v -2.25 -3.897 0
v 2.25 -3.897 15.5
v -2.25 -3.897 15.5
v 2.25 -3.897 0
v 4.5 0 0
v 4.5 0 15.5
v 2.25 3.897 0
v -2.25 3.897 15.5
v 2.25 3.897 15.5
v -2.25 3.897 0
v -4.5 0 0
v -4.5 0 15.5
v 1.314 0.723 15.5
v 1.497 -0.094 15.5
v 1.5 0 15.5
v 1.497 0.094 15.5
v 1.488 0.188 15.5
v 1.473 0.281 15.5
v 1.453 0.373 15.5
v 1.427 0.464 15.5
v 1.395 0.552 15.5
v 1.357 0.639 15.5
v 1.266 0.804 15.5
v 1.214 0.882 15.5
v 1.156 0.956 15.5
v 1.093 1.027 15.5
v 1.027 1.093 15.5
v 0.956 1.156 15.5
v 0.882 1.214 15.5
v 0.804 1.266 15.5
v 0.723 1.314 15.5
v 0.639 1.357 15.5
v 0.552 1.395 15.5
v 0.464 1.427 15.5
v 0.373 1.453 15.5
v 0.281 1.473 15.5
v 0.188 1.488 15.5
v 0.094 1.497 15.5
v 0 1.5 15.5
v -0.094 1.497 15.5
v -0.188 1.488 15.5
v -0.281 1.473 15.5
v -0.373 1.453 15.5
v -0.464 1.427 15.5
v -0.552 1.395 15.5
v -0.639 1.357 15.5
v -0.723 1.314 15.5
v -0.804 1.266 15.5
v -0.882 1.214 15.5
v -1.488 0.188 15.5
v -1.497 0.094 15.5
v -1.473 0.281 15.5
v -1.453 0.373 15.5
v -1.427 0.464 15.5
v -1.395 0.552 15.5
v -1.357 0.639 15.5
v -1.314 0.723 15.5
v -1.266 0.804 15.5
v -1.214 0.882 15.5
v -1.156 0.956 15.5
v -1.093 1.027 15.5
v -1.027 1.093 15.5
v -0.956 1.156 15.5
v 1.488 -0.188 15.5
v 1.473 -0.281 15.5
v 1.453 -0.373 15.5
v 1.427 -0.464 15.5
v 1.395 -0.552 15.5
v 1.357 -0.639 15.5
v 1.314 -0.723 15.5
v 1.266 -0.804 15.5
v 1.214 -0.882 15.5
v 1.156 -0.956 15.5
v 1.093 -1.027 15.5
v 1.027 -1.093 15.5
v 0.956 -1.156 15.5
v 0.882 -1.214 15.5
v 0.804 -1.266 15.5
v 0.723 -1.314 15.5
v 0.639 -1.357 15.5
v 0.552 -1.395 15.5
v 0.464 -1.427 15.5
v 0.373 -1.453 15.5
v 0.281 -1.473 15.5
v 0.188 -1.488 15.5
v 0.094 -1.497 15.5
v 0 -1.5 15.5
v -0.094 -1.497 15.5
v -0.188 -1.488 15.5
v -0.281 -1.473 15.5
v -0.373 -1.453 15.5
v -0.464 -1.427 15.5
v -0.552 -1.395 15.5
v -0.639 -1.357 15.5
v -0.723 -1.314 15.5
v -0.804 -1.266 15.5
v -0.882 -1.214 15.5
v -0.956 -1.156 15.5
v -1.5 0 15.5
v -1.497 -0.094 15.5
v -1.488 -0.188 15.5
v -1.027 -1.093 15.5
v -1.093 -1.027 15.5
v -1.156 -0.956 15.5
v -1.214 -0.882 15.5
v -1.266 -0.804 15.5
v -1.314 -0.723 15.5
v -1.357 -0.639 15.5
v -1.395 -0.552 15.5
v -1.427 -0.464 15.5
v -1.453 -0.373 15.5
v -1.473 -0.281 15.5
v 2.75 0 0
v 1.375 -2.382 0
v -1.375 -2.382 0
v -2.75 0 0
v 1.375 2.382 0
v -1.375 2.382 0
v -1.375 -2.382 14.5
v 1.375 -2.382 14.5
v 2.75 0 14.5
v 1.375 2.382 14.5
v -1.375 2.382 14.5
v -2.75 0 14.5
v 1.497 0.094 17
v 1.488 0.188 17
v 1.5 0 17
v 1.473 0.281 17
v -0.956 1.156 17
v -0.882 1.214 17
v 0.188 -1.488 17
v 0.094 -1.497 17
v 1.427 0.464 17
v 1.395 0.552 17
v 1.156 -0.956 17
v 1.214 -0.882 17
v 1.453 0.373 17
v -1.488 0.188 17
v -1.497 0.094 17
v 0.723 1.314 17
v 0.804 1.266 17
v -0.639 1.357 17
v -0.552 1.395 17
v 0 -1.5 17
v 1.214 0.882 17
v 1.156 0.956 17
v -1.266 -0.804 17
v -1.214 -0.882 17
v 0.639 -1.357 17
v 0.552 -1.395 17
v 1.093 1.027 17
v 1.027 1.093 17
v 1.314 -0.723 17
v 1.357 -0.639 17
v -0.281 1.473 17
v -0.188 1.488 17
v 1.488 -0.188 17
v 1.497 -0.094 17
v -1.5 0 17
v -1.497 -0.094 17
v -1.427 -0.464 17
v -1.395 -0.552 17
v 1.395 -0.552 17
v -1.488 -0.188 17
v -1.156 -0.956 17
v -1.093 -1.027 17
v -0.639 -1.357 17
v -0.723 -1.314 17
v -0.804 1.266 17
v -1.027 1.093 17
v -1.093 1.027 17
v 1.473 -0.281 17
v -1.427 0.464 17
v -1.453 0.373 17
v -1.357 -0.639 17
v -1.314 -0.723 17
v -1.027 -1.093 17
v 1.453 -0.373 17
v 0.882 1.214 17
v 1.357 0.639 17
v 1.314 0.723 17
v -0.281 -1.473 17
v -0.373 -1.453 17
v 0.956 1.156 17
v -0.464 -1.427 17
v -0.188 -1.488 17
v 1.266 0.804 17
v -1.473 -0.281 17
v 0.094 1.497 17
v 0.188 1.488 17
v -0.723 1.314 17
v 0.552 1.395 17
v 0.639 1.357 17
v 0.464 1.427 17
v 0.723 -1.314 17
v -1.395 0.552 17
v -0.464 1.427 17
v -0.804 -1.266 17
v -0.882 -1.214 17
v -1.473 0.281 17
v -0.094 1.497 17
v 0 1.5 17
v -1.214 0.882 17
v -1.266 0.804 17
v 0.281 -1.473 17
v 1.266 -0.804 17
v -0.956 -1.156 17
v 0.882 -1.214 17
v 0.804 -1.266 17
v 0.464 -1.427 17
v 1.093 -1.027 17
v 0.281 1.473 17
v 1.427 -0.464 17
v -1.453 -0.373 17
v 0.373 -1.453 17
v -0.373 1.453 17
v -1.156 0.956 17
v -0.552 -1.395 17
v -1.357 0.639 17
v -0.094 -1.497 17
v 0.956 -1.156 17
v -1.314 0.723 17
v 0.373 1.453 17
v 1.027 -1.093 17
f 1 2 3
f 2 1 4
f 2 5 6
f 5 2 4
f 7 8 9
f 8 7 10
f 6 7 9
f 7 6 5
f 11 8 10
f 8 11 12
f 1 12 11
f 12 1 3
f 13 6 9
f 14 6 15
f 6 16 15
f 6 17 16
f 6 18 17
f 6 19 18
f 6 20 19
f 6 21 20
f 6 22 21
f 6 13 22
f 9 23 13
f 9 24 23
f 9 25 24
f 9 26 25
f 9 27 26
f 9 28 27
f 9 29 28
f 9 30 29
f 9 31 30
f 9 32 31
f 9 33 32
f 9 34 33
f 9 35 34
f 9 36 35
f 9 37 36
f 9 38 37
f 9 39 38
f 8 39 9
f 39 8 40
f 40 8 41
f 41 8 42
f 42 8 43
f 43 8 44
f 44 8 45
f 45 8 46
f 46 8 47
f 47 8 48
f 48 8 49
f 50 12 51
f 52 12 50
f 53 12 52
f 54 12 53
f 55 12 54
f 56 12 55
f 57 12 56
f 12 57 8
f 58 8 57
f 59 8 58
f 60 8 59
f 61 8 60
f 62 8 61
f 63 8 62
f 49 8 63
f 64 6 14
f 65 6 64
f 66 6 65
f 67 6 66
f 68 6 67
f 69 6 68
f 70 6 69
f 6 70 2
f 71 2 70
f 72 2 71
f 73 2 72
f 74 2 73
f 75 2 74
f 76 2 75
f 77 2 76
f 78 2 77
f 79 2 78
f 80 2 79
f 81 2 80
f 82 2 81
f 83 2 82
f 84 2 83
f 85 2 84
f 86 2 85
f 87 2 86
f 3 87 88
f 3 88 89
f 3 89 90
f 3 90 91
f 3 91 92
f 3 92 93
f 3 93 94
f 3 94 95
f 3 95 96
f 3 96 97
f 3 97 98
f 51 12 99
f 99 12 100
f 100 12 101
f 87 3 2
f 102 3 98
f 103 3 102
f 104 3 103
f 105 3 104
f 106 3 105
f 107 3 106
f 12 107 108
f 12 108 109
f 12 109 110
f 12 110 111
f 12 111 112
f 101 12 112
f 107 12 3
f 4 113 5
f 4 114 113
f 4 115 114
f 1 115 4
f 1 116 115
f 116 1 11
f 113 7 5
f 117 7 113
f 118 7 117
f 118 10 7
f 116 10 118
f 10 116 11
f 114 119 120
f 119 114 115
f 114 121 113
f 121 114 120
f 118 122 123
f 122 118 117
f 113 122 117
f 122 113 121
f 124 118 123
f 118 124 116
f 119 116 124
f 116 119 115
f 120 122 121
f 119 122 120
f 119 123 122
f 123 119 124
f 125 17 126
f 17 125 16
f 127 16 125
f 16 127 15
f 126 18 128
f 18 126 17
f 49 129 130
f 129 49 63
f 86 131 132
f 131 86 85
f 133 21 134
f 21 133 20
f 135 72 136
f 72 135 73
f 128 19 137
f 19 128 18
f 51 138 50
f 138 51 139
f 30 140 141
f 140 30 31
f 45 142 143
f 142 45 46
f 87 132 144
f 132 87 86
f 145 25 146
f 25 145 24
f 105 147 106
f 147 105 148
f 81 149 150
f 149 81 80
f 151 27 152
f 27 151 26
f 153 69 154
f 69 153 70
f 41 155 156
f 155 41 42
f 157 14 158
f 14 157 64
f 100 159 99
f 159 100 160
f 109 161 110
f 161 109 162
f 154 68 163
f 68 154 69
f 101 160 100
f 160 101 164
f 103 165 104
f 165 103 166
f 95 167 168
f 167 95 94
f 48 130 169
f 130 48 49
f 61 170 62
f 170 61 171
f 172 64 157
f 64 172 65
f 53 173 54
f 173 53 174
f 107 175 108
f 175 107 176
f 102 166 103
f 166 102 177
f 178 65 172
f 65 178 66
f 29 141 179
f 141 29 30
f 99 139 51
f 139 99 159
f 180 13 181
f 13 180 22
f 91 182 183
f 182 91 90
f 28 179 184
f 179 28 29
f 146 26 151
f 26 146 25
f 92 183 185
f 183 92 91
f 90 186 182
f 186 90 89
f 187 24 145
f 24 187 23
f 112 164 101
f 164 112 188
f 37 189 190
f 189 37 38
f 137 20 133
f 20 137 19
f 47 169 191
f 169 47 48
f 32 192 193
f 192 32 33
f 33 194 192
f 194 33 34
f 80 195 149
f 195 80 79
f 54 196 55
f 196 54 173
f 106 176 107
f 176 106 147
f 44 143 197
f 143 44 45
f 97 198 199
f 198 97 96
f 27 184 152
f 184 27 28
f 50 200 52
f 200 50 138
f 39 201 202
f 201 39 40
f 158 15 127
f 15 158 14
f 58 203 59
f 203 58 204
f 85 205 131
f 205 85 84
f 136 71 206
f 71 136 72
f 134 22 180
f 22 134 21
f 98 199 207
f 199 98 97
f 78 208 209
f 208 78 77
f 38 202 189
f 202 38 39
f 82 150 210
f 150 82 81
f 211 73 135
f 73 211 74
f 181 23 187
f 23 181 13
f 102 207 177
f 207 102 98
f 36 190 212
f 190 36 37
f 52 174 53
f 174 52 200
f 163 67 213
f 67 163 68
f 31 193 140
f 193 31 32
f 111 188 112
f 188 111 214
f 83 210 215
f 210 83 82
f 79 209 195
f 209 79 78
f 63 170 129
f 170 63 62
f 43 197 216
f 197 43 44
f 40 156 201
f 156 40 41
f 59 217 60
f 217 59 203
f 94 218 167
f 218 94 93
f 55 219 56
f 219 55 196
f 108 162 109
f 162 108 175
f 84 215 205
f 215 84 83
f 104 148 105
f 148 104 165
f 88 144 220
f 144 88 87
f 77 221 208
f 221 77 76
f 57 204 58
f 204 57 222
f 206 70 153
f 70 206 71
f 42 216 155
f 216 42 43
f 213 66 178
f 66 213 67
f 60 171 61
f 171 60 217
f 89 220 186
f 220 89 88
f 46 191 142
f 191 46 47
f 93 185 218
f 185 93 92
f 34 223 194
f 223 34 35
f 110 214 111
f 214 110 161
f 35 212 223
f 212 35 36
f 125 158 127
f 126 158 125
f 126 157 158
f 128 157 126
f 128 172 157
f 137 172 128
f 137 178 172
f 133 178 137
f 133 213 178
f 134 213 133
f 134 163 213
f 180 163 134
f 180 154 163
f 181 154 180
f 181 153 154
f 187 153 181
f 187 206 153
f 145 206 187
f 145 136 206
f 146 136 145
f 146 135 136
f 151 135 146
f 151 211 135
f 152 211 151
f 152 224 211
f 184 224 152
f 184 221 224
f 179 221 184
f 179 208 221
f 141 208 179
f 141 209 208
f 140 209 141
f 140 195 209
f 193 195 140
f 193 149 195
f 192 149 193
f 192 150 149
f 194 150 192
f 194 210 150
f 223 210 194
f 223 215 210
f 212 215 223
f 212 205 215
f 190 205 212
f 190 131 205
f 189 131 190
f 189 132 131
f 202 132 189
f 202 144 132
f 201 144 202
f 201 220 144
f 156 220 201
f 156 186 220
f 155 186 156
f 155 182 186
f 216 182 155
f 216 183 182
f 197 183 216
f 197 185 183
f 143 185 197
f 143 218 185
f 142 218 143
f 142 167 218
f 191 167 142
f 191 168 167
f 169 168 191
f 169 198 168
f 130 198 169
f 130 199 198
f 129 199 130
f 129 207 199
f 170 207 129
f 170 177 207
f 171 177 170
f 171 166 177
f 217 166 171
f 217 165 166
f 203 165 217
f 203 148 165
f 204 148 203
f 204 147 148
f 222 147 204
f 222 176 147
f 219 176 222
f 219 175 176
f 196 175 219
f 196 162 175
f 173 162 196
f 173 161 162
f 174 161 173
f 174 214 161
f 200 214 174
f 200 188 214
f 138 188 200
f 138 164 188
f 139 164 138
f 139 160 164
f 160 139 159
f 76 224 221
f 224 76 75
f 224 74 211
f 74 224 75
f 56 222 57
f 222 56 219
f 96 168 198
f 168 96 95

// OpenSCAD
$fn=6;
inch = 25.4;
H = 15.5;

module standoff(h, d, D){
  translate([0, 0, h])cylinder(h=1.5, d=3, $fn=100);
  difference(){
    cylinder(h=h, d=D);
    translate([0, 0, -1])cylinder(h=h, d=d, $fn=6);
  }
}

standoff(H, 5.5, 9);
